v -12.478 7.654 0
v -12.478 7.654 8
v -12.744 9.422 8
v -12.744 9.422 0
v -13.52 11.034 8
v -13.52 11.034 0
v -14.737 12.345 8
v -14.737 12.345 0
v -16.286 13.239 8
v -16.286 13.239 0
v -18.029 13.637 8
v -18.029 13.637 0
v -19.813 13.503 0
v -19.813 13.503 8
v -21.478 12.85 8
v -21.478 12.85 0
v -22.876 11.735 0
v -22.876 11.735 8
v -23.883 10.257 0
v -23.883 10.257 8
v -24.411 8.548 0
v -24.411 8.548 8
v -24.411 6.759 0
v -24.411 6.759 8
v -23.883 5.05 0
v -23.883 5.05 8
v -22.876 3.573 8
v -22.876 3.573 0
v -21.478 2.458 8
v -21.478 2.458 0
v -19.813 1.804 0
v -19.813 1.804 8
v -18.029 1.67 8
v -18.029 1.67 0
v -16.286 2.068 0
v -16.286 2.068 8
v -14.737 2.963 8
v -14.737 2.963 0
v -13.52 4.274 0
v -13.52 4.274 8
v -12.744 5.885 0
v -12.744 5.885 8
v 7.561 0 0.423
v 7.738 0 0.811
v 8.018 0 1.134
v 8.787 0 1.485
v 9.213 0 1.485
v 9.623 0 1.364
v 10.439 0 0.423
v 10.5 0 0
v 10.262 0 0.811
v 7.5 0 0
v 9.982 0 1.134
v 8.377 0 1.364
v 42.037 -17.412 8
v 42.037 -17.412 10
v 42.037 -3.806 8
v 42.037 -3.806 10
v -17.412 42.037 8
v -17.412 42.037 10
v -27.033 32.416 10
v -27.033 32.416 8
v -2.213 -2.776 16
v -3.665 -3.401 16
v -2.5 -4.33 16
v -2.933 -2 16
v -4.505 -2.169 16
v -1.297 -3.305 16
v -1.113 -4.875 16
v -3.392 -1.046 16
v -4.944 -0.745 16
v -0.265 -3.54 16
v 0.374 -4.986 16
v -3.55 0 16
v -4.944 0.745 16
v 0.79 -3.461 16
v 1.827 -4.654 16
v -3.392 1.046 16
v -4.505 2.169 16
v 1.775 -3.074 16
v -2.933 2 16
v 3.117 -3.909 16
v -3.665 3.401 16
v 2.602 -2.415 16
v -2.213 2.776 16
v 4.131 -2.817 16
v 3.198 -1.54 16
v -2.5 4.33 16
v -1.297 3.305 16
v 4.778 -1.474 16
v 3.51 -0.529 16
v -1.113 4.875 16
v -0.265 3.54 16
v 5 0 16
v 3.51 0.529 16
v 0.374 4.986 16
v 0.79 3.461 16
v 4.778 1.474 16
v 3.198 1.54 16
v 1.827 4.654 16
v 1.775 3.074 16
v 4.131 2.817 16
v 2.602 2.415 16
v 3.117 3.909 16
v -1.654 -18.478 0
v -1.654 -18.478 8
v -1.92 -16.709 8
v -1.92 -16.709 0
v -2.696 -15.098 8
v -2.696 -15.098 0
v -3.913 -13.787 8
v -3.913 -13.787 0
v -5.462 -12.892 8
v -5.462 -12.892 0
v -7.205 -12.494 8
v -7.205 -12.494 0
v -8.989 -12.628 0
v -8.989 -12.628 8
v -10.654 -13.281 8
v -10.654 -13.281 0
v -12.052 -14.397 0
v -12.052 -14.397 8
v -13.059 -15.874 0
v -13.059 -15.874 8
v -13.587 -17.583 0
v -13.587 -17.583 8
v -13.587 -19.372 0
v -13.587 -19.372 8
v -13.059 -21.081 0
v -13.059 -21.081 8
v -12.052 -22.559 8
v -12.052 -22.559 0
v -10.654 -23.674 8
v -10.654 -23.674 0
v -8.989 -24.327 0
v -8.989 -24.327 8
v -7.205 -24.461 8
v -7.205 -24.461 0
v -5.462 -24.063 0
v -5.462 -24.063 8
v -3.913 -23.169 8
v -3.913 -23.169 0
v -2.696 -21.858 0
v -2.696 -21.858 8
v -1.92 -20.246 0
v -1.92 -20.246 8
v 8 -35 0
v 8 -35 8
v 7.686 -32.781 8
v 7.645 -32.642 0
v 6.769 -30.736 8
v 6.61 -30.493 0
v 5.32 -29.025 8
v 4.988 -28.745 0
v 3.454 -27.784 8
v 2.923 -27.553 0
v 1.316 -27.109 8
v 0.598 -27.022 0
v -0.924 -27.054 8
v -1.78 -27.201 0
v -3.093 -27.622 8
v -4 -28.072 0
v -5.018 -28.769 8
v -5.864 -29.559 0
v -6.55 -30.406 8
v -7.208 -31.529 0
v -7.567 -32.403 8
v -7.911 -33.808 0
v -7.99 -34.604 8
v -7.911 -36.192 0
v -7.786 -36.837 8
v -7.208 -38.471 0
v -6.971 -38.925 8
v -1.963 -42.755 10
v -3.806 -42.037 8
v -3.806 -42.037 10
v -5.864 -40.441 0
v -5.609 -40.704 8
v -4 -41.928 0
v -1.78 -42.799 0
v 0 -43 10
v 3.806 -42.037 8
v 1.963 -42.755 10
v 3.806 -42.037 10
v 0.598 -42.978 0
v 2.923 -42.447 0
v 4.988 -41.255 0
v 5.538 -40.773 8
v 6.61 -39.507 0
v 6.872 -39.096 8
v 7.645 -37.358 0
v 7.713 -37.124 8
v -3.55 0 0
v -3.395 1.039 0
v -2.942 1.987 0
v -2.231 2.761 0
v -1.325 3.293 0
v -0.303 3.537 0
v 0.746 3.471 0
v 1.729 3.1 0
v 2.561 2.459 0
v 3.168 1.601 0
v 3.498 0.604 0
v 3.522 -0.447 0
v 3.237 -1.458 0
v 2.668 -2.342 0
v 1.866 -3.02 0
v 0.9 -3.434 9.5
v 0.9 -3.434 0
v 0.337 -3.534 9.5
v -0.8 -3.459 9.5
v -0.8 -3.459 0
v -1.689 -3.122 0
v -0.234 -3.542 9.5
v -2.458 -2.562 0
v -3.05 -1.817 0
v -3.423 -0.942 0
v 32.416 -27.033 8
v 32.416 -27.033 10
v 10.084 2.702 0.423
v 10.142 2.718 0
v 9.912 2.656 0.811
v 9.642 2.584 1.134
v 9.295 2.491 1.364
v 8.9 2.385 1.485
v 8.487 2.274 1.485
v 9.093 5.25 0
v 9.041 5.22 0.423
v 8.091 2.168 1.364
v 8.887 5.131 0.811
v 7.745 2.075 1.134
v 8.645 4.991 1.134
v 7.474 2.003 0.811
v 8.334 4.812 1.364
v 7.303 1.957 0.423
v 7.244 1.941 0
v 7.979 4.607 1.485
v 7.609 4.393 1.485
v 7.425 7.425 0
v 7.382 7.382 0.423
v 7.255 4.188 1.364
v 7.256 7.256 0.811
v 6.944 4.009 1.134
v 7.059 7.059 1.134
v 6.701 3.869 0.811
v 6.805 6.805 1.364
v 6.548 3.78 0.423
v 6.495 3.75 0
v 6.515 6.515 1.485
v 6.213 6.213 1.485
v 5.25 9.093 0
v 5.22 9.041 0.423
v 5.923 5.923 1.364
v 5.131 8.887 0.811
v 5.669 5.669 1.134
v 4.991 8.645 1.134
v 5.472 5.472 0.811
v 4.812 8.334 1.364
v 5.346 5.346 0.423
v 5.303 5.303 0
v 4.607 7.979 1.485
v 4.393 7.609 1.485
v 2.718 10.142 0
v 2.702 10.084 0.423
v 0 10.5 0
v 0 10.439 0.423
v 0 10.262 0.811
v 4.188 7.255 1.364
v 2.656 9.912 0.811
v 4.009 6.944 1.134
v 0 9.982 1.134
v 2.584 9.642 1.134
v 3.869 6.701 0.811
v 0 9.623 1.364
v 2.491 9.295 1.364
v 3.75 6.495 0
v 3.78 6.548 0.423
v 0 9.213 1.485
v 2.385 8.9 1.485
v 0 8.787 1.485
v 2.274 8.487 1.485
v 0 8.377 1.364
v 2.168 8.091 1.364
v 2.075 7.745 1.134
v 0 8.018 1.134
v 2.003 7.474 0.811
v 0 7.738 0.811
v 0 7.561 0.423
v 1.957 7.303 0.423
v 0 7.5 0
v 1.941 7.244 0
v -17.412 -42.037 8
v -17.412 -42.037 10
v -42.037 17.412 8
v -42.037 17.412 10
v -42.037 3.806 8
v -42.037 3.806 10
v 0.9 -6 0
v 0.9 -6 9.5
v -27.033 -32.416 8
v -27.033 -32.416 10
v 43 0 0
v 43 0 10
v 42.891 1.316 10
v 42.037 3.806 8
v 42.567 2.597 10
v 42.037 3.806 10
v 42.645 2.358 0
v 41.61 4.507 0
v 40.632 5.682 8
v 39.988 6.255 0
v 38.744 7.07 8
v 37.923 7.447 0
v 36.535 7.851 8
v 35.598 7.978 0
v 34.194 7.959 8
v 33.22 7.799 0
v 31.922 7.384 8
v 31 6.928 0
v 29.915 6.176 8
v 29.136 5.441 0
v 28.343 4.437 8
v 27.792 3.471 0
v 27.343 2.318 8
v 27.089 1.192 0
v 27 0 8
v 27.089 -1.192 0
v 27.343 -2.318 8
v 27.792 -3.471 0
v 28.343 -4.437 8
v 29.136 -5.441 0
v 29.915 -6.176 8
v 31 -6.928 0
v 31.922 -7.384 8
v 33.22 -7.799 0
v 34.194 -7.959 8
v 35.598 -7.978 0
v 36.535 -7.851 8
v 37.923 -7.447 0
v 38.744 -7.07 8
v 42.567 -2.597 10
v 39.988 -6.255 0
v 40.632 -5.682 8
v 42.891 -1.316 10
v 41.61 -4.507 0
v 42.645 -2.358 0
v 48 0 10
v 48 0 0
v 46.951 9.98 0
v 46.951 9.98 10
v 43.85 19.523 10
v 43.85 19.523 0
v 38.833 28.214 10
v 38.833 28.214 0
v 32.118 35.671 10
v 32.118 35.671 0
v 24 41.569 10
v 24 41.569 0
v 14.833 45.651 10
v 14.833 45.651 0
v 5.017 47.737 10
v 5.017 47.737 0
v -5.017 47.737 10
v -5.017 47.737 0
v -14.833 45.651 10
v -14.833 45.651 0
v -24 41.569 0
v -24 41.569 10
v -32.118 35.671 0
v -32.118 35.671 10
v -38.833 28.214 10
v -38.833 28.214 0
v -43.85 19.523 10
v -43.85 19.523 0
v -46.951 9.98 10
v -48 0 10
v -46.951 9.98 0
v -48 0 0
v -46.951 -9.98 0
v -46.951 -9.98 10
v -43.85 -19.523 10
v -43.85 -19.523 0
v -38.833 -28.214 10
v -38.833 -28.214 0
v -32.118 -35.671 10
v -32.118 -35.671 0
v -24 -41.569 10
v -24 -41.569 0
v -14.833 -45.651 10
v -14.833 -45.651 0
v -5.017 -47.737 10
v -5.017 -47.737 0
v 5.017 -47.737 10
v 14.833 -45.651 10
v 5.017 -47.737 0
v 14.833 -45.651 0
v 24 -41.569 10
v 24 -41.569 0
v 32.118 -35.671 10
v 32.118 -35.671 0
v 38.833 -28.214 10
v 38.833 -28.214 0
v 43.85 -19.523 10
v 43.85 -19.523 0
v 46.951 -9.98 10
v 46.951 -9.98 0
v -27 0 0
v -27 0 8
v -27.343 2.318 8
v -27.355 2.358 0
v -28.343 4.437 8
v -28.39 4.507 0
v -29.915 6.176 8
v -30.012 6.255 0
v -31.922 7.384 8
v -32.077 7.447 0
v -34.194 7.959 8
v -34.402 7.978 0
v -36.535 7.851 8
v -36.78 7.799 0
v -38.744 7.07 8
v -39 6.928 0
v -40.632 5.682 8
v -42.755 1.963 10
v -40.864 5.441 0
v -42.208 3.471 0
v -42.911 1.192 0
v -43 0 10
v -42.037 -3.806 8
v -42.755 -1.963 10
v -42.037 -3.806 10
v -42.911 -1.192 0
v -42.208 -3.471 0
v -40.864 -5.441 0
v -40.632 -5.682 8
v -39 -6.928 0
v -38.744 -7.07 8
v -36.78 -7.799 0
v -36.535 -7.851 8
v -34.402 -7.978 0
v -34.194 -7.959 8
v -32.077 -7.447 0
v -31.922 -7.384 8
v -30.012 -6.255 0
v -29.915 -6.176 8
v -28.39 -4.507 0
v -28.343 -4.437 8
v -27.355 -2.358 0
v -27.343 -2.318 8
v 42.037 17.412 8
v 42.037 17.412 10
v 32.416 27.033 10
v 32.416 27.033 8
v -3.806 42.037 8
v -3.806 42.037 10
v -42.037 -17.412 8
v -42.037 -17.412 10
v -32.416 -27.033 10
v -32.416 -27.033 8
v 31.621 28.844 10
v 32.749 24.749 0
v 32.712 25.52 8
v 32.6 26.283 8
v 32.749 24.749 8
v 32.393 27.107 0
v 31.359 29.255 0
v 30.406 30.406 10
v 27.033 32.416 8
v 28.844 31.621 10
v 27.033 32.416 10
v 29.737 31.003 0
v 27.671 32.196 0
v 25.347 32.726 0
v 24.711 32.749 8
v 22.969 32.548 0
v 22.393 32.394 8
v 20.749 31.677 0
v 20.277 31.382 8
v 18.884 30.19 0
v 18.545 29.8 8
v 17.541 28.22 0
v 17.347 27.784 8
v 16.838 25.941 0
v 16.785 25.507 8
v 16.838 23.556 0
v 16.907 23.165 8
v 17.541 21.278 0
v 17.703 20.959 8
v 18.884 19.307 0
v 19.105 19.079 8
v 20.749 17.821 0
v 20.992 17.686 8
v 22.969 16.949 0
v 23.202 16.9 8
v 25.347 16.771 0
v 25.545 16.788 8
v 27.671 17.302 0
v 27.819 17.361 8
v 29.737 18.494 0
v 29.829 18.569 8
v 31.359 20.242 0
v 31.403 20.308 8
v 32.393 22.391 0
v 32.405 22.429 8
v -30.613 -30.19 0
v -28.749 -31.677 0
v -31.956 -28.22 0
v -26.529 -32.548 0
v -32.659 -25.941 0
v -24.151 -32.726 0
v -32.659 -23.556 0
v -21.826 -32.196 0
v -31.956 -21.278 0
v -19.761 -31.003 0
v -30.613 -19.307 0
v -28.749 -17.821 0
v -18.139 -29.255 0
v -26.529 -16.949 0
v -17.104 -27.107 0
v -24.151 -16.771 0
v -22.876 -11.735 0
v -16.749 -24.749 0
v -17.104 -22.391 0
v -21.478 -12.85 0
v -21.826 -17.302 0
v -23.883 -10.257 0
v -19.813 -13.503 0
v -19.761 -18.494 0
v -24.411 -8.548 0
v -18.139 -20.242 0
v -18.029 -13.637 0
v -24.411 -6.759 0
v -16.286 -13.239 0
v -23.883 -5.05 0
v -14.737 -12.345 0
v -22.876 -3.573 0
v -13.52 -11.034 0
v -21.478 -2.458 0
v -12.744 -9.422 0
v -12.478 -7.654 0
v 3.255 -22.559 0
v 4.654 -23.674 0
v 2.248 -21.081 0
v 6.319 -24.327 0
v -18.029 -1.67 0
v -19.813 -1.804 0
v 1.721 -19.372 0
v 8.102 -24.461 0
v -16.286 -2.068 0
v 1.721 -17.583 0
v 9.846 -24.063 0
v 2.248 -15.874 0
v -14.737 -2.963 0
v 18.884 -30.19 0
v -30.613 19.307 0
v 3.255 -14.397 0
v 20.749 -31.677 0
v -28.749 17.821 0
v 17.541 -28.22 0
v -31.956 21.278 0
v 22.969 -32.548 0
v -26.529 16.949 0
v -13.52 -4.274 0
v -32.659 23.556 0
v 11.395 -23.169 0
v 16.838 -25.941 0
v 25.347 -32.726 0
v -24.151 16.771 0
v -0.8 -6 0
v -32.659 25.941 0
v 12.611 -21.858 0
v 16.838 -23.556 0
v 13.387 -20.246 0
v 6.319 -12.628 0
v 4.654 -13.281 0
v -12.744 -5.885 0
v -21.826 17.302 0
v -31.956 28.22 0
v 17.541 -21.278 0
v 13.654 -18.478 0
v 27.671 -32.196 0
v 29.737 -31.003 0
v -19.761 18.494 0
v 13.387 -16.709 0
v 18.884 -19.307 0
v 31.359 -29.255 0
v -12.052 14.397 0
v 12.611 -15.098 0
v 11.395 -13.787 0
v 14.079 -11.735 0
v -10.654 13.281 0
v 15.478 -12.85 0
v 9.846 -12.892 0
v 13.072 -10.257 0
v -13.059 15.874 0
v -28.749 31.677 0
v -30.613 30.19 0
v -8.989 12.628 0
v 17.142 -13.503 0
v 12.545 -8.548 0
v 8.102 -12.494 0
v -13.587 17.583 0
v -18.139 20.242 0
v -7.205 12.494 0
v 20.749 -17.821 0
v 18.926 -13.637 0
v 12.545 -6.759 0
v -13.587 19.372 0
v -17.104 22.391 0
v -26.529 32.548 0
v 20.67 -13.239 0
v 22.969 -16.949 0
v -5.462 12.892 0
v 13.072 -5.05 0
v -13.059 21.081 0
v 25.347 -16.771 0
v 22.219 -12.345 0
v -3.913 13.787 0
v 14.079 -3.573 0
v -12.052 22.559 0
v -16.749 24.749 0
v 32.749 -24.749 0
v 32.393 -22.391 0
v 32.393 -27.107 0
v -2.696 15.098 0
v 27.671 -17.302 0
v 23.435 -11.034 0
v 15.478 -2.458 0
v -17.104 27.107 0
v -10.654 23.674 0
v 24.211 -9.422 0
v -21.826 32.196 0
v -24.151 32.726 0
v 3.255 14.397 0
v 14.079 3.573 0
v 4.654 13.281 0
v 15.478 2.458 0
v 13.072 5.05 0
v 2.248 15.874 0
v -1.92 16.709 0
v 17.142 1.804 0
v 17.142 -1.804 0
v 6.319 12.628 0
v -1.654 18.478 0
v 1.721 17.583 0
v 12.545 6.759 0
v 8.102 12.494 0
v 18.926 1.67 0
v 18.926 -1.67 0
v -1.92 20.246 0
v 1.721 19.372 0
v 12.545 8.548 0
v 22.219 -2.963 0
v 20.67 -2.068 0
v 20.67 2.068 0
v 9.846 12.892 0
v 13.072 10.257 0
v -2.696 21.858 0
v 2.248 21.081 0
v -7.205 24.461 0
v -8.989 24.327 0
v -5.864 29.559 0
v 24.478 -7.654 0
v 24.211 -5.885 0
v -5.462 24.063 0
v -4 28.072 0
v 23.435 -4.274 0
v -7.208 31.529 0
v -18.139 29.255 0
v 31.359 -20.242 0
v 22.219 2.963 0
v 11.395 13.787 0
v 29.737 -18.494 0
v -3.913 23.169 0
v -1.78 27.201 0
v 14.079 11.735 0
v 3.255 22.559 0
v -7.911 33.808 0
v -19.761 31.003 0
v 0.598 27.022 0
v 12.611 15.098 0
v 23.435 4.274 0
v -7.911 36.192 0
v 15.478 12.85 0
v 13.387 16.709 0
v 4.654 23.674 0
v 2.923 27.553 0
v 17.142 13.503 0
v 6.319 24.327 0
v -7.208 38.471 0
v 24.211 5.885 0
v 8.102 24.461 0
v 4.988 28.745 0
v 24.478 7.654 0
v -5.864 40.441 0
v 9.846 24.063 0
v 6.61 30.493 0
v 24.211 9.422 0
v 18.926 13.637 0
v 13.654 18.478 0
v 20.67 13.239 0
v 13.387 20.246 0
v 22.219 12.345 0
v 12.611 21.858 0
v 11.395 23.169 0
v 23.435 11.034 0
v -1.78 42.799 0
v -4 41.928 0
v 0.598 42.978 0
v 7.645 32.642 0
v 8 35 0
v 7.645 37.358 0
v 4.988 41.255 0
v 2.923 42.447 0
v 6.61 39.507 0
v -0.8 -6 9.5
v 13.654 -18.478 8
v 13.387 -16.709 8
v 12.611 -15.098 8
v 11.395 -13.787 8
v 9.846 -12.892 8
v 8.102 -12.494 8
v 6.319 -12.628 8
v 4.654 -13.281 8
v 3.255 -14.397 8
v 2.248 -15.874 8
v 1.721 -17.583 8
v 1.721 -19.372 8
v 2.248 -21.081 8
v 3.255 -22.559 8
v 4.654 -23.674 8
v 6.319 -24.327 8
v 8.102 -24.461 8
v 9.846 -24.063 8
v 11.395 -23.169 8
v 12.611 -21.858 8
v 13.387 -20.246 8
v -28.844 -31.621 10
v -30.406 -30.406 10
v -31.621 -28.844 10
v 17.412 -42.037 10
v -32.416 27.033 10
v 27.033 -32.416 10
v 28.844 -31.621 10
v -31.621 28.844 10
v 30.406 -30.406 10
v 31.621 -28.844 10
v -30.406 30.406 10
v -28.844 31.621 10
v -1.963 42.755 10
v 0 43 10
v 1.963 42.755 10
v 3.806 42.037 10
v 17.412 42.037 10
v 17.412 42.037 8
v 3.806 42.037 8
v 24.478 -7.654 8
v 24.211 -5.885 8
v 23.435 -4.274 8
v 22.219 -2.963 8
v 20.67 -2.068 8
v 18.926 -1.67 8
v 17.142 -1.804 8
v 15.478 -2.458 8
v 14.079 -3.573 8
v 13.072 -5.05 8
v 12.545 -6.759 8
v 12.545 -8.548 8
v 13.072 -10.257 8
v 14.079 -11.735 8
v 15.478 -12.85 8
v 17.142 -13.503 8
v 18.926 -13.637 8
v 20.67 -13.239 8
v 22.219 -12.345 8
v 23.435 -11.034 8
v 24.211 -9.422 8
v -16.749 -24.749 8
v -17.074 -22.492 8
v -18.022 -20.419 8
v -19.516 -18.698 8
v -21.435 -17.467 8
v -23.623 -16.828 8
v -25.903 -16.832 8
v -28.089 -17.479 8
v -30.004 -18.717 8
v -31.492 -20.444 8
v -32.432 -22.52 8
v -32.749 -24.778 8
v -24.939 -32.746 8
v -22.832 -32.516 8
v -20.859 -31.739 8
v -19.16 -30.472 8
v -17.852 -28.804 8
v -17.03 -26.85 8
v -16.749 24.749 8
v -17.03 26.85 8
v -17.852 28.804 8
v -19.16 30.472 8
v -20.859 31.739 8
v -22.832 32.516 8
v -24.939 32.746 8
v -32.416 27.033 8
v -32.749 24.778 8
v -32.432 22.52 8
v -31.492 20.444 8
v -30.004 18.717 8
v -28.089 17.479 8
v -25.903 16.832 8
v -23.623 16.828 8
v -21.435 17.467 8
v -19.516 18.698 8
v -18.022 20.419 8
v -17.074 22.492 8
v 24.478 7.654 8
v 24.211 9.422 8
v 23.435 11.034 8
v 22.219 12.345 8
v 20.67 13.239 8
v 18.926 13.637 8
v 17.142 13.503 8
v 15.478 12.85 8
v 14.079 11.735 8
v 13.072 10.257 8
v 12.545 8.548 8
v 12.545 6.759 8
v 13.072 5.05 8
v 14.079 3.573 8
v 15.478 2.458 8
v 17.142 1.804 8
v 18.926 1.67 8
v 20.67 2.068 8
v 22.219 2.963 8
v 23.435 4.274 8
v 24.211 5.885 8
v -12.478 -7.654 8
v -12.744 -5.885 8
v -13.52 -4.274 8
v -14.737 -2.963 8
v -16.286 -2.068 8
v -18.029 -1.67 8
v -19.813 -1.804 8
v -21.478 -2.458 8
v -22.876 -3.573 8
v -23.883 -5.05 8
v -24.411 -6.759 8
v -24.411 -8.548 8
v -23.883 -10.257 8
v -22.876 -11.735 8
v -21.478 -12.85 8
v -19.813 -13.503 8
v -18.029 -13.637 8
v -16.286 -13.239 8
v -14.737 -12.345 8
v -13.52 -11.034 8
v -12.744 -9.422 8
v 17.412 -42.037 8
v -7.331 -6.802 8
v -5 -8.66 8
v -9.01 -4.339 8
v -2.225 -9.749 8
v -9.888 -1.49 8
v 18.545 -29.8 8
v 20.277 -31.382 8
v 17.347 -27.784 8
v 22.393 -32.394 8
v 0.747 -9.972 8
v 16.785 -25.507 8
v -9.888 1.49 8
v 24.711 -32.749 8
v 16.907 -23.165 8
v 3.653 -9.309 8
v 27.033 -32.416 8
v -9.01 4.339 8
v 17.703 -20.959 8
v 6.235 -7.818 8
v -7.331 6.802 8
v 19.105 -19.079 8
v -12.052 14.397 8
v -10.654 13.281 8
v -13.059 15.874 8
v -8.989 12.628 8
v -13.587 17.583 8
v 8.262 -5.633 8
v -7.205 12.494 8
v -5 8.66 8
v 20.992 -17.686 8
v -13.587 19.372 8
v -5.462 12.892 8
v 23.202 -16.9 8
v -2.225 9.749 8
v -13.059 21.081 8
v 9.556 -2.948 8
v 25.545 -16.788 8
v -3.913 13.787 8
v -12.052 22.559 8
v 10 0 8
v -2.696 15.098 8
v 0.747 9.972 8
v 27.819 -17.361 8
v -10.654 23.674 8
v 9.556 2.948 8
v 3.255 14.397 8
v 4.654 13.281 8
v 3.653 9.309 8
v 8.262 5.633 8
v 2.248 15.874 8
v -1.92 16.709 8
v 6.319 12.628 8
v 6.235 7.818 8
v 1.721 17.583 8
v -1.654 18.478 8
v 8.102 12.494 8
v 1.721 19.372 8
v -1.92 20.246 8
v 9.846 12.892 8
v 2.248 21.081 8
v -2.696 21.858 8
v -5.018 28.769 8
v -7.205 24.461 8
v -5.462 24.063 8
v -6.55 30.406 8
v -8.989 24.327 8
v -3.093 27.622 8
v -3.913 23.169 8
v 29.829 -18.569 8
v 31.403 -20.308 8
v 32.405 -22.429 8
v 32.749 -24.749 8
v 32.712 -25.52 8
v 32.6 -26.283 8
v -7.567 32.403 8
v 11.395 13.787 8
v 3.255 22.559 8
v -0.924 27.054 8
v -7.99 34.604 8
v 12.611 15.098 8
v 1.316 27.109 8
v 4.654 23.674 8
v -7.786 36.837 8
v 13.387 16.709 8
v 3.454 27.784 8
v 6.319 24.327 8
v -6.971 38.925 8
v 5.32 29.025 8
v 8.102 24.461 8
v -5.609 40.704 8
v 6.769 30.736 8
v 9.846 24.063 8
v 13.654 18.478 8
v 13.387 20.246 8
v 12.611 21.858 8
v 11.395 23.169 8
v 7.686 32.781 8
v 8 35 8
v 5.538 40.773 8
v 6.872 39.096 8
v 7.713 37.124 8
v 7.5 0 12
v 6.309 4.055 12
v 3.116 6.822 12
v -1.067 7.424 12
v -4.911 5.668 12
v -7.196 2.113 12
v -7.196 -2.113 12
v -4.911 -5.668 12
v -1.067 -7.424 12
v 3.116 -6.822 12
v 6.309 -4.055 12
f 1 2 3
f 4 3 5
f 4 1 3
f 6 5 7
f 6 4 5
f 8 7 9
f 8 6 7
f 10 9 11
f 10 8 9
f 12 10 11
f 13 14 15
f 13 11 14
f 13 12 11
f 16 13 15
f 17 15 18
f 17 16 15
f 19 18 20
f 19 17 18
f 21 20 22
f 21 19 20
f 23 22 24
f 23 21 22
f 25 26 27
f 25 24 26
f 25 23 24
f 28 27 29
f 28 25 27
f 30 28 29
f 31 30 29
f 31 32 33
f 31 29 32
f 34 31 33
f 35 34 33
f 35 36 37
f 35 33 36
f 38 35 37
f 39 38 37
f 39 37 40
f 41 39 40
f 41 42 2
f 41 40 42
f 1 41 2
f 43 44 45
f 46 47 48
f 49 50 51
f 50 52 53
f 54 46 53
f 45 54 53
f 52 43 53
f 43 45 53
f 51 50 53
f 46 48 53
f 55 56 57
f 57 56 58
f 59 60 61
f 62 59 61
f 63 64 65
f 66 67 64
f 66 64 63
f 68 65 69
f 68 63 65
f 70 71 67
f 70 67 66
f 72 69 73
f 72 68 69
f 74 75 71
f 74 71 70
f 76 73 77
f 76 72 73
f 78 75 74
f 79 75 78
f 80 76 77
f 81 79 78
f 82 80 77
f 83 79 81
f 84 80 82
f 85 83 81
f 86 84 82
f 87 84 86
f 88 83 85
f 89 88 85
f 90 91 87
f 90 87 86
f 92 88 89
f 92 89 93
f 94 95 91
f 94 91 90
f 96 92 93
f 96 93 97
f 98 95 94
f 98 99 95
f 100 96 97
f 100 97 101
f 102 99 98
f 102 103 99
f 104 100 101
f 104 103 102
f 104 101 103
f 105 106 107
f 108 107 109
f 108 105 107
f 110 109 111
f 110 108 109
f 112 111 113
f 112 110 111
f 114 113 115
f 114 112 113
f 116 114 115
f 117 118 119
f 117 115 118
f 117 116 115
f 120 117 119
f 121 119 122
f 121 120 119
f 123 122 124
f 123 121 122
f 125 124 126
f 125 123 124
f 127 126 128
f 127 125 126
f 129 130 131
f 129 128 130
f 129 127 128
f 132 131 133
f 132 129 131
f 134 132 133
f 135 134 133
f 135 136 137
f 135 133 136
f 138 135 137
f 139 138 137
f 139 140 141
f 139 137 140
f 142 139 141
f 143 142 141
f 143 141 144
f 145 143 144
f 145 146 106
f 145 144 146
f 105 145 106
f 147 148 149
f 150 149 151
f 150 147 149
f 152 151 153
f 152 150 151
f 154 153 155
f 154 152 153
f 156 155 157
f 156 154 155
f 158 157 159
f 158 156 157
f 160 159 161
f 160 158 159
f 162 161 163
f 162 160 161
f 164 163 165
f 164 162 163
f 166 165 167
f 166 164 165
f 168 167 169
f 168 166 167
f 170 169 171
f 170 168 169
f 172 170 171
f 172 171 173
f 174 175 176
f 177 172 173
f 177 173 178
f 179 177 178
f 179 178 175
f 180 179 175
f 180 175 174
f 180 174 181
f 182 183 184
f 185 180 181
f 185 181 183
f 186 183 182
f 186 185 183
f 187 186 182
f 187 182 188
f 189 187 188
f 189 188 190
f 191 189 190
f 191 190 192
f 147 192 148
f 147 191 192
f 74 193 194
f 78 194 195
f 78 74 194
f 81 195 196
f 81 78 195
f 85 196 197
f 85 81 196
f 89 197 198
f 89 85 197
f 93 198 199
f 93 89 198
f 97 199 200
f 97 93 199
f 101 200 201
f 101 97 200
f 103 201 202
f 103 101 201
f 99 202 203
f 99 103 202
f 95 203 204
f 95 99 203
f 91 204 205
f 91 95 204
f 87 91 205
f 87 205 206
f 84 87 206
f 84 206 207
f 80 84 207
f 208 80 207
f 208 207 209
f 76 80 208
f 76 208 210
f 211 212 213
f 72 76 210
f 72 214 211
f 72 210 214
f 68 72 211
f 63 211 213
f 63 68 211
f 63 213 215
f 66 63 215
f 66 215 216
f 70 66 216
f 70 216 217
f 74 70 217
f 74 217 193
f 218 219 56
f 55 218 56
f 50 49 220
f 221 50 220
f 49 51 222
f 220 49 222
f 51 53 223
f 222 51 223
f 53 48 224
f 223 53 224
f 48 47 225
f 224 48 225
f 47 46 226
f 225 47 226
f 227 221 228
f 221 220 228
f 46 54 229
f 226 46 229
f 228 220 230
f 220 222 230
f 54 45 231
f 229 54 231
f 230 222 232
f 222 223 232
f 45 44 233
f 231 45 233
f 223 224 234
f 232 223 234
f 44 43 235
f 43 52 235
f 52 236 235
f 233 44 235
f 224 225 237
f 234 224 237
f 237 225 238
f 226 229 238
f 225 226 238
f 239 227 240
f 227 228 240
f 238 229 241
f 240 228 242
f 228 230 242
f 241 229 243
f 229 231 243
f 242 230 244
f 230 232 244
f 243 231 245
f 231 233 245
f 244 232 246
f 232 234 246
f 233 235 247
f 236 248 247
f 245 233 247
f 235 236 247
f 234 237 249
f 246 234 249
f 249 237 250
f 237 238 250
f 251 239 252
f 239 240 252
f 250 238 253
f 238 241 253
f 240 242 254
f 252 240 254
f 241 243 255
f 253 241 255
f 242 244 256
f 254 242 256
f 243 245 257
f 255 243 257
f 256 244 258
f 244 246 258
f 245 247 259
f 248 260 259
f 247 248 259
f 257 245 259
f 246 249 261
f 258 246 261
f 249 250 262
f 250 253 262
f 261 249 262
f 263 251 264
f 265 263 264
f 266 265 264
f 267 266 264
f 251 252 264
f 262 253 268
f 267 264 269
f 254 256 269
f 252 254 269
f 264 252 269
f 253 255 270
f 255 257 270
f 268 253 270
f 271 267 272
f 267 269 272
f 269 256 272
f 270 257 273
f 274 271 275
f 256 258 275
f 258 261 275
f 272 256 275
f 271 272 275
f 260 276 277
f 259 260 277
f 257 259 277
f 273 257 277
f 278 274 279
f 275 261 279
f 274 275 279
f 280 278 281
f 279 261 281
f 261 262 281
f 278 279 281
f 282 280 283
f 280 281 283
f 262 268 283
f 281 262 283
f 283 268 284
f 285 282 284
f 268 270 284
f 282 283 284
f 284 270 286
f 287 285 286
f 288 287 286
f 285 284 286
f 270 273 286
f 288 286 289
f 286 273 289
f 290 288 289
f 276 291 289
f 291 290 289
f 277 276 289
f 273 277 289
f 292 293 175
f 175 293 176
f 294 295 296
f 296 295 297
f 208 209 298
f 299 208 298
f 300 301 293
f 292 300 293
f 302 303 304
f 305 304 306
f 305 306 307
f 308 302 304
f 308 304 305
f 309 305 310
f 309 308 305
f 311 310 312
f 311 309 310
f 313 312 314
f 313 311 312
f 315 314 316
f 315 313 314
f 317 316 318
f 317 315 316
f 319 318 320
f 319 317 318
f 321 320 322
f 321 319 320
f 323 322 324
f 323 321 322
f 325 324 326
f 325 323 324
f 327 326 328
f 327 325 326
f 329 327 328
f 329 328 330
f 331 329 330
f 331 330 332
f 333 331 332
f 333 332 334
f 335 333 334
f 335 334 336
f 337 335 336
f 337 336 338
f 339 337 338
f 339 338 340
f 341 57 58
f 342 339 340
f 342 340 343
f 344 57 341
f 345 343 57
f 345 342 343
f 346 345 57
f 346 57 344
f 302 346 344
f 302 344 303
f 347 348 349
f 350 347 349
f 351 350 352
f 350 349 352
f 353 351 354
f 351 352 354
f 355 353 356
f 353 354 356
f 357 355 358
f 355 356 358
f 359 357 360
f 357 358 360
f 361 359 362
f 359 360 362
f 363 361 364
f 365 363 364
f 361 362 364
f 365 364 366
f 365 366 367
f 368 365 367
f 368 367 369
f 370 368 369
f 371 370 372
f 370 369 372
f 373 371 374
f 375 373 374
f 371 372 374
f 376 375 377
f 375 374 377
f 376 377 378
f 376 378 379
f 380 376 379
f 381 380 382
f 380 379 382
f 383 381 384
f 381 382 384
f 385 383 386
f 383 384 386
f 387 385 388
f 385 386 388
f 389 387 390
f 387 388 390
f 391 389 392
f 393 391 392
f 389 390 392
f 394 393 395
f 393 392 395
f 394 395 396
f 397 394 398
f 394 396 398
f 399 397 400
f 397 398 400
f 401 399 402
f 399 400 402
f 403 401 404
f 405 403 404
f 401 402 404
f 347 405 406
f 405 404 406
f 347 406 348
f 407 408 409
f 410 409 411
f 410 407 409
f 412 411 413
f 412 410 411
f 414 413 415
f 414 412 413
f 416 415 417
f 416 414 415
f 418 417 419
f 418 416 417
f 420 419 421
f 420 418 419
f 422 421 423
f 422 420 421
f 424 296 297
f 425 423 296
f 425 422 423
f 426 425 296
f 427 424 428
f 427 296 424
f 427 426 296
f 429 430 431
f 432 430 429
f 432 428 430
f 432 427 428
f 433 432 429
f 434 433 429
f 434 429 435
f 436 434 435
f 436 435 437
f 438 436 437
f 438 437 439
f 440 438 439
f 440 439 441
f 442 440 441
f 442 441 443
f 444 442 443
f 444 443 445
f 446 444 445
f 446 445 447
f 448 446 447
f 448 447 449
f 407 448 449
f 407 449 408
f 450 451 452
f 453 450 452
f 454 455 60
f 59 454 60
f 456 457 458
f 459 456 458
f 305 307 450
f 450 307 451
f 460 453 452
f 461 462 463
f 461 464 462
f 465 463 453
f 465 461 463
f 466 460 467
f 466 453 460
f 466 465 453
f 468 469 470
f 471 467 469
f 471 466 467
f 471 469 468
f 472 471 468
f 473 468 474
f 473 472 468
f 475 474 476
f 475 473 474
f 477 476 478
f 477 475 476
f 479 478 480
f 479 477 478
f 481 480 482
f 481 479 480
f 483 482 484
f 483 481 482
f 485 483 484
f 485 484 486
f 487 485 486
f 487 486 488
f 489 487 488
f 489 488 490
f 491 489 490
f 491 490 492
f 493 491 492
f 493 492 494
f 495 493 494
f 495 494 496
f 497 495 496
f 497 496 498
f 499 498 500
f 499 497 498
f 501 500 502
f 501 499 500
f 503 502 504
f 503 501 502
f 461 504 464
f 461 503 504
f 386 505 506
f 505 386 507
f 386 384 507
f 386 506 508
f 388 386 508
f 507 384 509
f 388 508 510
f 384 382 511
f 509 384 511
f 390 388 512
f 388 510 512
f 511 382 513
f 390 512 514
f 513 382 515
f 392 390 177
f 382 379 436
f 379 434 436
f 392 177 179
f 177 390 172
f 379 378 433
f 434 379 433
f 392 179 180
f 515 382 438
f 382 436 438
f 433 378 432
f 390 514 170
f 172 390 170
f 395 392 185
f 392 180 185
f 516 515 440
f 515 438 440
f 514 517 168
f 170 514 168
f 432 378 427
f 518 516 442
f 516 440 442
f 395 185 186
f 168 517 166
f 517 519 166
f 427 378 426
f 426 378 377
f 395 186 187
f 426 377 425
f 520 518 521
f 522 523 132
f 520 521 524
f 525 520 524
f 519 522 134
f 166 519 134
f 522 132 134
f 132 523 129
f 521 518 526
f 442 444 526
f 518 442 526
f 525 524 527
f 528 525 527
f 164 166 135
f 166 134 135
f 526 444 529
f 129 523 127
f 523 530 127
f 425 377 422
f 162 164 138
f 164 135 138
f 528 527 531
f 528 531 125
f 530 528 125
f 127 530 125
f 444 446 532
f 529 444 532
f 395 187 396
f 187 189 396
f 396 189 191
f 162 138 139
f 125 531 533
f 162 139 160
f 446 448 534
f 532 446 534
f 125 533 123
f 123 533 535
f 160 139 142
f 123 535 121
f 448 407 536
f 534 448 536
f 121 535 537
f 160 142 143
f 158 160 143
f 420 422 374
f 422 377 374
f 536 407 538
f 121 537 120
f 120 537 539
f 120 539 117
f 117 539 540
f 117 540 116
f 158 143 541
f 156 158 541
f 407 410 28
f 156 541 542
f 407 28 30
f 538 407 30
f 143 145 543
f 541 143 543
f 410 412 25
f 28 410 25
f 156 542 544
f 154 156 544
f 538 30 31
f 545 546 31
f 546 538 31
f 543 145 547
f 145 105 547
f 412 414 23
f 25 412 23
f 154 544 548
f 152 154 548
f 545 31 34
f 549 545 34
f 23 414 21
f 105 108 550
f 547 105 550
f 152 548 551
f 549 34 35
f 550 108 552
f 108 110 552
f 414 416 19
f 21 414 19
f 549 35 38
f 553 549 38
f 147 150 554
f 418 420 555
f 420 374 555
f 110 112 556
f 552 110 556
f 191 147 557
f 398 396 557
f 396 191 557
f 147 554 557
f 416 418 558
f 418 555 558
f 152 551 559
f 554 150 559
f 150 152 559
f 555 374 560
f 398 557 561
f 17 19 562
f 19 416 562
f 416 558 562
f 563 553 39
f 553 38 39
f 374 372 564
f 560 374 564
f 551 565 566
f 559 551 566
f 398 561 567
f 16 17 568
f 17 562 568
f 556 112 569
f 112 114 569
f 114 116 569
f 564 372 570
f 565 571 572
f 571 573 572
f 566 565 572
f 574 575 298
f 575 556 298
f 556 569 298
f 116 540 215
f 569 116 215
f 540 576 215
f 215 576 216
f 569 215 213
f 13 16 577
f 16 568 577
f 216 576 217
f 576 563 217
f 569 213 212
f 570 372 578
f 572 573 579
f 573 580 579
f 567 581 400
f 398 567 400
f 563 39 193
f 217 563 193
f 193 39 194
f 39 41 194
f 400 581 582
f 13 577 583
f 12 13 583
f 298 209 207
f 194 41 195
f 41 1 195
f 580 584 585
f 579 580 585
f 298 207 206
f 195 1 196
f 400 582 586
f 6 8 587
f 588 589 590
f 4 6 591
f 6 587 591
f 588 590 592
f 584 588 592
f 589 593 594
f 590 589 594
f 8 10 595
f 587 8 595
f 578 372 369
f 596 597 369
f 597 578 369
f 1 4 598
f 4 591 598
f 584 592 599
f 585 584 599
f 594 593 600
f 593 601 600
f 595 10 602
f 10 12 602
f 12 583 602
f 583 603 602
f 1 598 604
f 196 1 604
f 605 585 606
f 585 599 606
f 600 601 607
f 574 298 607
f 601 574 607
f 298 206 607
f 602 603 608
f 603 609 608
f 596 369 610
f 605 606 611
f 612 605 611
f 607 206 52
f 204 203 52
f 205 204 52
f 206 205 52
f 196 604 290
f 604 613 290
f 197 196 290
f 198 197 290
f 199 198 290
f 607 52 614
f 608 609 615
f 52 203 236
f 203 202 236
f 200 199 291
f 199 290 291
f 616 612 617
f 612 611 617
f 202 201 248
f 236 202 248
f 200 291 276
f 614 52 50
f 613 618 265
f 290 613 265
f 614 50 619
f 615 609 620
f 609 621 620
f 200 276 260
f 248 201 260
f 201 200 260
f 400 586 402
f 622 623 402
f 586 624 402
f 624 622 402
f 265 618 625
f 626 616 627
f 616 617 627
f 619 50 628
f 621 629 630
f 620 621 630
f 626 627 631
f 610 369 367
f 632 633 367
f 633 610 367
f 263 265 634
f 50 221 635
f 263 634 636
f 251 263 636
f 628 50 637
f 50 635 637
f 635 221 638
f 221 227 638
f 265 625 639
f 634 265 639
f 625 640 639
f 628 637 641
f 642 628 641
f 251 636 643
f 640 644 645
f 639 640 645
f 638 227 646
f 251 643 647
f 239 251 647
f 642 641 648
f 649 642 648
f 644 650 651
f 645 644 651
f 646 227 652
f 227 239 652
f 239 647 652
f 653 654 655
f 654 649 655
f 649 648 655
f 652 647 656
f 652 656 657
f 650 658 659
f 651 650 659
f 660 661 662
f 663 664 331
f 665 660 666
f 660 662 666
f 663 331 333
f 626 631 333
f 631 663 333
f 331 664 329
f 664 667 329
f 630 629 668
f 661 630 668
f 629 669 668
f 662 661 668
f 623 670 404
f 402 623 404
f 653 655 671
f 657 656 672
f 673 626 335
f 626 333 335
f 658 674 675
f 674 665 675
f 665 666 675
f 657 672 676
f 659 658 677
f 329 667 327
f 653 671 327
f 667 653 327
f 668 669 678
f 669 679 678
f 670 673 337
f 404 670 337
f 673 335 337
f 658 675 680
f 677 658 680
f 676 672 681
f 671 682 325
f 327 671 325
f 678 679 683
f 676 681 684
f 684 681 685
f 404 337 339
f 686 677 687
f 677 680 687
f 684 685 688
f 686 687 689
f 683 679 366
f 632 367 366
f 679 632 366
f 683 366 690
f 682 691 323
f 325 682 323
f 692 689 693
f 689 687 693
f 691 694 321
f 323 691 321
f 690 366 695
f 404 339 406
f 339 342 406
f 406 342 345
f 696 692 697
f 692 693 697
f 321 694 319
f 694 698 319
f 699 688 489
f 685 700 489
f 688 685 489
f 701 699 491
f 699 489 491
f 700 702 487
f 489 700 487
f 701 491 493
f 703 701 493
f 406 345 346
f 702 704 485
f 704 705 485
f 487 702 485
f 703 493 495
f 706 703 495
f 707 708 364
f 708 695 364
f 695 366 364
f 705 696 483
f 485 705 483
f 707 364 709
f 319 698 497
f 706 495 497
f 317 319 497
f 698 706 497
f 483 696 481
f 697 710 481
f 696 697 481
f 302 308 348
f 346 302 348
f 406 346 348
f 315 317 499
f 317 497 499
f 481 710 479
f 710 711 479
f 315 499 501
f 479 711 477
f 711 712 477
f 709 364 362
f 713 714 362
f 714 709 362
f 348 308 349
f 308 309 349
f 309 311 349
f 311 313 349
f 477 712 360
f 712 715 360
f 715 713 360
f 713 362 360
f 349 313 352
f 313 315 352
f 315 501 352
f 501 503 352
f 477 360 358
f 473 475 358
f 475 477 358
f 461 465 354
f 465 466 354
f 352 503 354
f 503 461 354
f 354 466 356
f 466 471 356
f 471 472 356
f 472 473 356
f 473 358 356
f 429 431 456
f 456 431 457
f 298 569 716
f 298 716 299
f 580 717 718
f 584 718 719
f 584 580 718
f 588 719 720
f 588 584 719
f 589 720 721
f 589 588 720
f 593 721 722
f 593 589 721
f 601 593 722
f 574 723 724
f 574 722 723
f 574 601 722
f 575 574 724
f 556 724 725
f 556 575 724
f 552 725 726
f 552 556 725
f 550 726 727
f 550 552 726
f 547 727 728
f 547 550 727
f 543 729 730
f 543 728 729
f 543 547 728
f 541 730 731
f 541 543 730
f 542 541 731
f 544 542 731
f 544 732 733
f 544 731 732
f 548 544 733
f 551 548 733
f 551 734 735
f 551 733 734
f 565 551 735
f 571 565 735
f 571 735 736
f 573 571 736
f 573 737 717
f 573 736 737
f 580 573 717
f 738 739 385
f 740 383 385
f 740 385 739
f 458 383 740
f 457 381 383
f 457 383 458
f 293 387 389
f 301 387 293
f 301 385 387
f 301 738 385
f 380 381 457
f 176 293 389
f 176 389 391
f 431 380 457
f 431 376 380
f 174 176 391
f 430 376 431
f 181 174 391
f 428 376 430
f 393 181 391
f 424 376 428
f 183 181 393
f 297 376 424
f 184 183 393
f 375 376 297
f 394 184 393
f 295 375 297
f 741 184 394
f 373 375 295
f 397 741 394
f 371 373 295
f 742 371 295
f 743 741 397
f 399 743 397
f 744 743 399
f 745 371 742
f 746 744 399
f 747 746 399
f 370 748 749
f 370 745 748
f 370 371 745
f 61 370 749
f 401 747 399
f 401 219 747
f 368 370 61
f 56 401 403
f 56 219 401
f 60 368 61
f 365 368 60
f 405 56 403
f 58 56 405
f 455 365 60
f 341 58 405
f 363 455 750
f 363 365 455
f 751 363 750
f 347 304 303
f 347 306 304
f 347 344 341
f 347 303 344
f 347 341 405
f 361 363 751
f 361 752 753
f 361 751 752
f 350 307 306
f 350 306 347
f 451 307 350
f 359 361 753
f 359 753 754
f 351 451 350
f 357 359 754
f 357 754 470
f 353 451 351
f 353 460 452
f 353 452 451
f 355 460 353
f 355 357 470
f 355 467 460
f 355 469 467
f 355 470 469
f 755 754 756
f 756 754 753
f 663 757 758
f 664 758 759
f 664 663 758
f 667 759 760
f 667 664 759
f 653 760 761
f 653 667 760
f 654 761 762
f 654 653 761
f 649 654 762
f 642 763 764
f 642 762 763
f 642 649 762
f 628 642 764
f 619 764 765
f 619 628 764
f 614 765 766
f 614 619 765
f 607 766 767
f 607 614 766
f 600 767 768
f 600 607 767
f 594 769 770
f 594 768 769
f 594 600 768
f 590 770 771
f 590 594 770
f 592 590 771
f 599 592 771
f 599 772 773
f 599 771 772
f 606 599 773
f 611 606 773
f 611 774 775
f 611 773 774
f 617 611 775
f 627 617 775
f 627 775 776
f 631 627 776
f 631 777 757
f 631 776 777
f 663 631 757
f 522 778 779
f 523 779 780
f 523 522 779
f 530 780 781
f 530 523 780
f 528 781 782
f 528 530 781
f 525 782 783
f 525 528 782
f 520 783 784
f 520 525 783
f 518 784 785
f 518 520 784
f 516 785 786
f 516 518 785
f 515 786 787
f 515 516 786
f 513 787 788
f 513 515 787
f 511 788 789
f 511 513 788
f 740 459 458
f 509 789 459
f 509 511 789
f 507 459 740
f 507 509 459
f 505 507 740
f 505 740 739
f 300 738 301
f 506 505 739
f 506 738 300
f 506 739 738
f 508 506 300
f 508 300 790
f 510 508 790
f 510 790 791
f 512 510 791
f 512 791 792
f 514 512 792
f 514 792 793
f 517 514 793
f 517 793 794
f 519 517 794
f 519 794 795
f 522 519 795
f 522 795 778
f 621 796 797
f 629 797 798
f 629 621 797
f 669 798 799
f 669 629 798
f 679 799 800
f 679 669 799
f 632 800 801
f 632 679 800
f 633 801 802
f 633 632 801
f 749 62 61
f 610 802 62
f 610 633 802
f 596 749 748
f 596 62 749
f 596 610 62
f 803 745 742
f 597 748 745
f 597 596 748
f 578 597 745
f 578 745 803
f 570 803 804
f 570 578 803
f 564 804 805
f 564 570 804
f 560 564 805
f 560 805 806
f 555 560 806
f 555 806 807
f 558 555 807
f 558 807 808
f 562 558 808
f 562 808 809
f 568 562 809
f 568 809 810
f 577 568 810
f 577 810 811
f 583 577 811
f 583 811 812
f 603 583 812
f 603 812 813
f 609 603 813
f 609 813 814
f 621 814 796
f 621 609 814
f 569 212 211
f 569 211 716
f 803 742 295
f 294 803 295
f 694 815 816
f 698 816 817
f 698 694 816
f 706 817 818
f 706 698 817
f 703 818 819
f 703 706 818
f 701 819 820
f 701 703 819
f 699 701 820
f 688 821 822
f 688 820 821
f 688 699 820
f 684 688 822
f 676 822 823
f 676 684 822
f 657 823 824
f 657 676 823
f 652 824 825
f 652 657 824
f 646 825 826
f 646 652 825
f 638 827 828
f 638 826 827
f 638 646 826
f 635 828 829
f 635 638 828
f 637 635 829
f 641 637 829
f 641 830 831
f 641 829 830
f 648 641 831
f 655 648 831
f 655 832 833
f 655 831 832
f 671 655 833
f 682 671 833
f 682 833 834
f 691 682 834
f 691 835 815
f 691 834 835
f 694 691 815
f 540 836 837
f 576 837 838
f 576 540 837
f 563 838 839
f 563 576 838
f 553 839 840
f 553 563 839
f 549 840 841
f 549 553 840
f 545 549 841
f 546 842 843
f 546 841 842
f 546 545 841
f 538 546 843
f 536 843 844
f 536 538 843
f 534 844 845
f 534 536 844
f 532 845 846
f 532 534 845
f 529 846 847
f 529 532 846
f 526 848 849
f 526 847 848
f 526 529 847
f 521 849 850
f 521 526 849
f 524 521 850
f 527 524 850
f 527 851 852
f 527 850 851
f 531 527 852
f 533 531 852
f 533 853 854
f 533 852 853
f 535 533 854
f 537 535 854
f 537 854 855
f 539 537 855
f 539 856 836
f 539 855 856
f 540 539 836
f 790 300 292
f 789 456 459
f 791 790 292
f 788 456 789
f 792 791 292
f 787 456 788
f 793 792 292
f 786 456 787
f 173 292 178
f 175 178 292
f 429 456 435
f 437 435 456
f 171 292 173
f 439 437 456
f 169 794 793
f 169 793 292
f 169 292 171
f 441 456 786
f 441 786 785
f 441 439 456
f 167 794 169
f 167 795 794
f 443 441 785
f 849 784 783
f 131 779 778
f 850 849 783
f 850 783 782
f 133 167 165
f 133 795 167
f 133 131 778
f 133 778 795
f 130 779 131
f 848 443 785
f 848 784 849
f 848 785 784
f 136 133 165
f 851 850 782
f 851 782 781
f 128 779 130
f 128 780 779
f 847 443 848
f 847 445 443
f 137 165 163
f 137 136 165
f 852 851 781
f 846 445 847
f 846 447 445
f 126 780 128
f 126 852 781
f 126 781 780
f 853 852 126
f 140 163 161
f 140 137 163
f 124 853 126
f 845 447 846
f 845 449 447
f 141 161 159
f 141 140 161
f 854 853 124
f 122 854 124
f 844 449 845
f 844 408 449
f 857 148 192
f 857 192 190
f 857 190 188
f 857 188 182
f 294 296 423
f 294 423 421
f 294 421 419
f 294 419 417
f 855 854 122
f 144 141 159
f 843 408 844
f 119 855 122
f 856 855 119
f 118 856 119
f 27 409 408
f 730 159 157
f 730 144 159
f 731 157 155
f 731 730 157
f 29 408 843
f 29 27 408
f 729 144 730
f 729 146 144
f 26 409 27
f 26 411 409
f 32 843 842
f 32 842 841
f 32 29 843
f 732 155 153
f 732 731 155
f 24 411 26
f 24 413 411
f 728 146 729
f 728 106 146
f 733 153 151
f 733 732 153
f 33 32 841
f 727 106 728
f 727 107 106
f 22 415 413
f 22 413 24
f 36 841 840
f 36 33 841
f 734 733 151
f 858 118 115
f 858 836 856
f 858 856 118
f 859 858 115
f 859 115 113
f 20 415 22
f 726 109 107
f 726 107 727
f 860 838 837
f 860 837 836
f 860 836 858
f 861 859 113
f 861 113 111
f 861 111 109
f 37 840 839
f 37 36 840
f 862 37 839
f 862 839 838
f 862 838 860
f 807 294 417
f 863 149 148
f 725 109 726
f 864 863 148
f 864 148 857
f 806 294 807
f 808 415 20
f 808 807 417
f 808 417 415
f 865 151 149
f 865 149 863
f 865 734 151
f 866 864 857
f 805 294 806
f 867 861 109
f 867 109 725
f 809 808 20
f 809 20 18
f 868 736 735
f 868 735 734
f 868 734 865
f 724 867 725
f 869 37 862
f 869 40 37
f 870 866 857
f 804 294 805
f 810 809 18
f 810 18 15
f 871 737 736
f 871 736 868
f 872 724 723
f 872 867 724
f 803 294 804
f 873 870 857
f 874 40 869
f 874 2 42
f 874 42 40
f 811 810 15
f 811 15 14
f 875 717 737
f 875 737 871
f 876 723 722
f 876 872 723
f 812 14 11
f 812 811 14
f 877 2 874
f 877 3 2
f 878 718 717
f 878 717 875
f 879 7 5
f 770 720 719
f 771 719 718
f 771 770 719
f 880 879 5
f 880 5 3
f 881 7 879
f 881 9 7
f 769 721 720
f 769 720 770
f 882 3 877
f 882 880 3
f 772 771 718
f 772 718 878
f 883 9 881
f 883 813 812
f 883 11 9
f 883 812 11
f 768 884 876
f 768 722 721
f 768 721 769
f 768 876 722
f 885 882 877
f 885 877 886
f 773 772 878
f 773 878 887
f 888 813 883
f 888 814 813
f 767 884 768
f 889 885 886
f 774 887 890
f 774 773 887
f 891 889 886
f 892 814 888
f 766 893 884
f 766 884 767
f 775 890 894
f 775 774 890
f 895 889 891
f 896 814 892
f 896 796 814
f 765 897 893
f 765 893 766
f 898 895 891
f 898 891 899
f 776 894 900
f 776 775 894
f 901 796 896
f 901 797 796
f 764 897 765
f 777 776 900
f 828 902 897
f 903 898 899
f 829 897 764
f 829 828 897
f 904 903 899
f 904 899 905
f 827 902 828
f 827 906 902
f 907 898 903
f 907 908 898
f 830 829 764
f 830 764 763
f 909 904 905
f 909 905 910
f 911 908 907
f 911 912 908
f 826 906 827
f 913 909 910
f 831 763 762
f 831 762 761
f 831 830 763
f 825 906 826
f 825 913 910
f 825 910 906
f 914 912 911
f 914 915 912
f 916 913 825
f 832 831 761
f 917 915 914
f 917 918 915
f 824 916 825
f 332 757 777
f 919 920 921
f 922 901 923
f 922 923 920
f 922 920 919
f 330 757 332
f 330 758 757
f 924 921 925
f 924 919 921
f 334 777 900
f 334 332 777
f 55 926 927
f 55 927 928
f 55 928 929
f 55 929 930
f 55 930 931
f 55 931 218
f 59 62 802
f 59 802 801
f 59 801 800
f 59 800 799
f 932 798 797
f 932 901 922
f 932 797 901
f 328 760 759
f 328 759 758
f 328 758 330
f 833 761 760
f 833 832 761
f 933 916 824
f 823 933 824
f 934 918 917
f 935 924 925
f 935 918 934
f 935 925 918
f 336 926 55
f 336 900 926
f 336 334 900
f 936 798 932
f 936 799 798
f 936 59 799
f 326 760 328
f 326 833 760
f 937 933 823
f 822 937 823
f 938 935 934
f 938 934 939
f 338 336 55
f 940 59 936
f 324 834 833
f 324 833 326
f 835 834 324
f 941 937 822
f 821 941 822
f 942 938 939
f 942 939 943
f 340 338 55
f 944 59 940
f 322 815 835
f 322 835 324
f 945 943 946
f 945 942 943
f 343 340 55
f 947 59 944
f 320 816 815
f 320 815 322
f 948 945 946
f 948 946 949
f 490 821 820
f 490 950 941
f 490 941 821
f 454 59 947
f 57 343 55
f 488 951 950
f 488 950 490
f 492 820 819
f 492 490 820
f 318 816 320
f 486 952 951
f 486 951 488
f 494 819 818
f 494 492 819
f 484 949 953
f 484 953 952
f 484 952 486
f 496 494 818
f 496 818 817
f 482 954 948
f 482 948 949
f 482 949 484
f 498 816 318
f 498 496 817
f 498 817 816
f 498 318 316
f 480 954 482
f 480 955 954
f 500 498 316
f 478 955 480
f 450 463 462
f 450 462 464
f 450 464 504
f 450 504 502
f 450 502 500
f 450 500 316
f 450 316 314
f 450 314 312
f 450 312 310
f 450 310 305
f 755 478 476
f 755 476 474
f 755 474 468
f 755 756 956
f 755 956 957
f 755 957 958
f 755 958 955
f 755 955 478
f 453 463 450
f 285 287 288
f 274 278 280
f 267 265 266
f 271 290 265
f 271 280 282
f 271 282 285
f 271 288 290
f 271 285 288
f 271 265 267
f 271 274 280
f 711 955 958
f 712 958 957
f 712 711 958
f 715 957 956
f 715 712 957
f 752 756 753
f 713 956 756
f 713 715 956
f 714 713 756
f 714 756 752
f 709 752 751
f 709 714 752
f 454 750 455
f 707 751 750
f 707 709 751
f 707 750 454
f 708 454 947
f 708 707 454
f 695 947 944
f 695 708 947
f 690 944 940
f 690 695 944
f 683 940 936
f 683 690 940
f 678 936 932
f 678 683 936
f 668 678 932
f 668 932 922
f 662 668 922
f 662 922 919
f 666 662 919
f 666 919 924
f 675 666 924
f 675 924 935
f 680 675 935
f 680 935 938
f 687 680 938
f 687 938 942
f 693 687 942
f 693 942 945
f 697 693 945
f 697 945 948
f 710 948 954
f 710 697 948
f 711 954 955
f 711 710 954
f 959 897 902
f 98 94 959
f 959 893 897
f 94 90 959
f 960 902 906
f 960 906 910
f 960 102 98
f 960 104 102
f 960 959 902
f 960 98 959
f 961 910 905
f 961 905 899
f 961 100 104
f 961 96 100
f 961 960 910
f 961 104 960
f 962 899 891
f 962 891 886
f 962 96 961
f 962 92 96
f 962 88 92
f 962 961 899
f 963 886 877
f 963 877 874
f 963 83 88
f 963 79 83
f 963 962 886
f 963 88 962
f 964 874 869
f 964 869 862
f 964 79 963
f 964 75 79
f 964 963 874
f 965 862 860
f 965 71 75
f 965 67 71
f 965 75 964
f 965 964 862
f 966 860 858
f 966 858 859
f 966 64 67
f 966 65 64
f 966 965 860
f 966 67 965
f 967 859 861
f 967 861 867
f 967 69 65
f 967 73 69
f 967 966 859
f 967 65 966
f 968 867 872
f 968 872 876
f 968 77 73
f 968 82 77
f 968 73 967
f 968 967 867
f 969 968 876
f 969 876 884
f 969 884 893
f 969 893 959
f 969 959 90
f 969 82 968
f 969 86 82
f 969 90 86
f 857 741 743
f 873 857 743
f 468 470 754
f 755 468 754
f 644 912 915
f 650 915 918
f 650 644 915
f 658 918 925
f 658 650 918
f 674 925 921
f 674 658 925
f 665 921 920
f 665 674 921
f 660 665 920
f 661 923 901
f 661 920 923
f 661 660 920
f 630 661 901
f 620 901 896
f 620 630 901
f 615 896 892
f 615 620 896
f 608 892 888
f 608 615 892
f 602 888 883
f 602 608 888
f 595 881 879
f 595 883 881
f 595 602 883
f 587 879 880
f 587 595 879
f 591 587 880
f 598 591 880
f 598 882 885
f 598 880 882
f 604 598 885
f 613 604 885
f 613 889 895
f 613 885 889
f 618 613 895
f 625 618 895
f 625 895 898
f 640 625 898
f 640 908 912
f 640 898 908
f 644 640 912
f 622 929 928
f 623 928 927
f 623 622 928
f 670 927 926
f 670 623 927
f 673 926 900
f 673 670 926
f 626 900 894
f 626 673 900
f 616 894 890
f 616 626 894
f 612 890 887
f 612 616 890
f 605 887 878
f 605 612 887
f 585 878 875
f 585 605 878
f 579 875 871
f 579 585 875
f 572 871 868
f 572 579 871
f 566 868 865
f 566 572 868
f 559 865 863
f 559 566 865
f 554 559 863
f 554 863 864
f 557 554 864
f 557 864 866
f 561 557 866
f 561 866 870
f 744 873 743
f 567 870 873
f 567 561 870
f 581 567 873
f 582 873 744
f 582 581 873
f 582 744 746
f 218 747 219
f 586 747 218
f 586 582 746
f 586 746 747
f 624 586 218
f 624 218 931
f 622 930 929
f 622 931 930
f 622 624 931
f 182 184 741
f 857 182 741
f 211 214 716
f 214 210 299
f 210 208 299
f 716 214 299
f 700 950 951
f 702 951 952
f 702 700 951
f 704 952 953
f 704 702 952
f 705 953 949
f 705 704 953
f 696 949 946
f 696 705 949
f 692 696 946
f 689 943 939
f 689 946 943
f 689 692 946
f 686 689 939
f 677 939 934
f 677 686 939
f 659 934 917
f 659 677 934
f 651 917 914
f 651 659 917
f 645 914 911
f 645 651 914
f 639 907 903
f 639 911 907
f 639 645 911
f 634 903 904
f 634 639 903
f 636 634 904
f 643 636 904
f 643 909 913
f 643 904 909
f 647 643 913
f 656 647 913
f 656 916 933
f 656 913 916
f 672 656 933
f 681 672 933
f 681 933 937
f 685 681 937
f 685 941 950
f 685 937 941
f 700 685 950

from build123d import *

# Parameters (mm, degrees)
SKETCH_R       = 48
SKETCH_R_2     = 8
SKETCH_R_3     = 6
PAD_DEPTH      = 10
POCKET_DEPTH   = 2
CYLINDER_R     = 3.55
CYLINDER_DEPTH = 16
BOX_W          = 3
BOX_H          = 1.7
BOX_DEPTH      = 9.5
TORUS_R        = 1.5
TORUS_ANGLE    = 90


with BuildPart() as part:
    # Sketch → Pad (new body)
    with BuildSketch(Plane.XY):
        Circle(SKETCH_R)
        with Locations((0, 35)):
            Circle(SKETCH_R_2, mode=Mode.SUBTRACT)
        with Locations((24.748737, 24.748737)):
            Circle(SKETCH_R_2, mode=Mode.SUBTRACT)
        with Locations((35, 0)):
            Circle(SKETCH_R_2, mode=Mode.SUBTRACT)
        with Locations((24.748737, -24.748737)):
            Circle(SKETCH_R_2, mode=Mode.SUBTRACT)
        with Locations((0, -35)):
            Circle(SKETCH_R_2, mode=Mode.SUBTRACT)
        with Locations((-24.748737, -24.748737)):
            Circle(SKETCH_R_2, mode=Mode.SUBTRACT)
        with Locations((-35, 0)):
            Circle(SKETCH_R_2, mode=Mode.SUBTRACT)
        with Locations((-24.748737, 24.748737)):
            Circle(SKETCH_R_2, mode=Mode.SUBTRACT)
        with Locations((-7.653669, -18.477591)):
            Circle(SKETCH_R_3, mode=Mode.SUBTRACT)
        with Locations((7.653669, -18.477591)):
            Circle(SKETCH_R_3, mode=Mode.SUBTRACT)
        with Locations((18.477591, -7.653669)):
            Circle(SKETCH_R_3, mode=Mode.SUBTRACT)
        with Locations((18.477591, 7.653669)):
            Circle(SKETCH_R_3, mode=Mode.SUBTRACT)
        with Locations((7.653669, 18.477591)):
            Circle(SKETCH_R_3, mode=Mode.SUBTRACT)
        with Locations((-7.653669, 18.477591)):
            Circle(SKETCH_R_3, mode=Mode.SUBTRACT)
        with Locations((-18.477591, 7.653669)):
            Circle(SKETCH_R_3, mode=Mode.SUBTRACT)
        with Locations((-18.477591, -7.653669)):
            Circle(SKETCH_R_3, mode=Mode.SUBTRACT)
    extrude(amount=PAD_DEPTH)

    # Sketch001 (on Face19 of Pad) → Pocket (cut)
    with BuildSketch(Plane.XY.offset(10)):
        Polygon((42.036519, 17.412096), (17.412096, 42.036519), (-17.412096, 42.036519), (-42.036519, 17.412096), (-42.036519, -17.412096), (-17.412096, -42.036519), (17.412096, -42.036519), (42.036519, -17.412096), align=None)
    extrude(amount=-POCKET_DEPTH, mode=Mode.SUBTRACT)

    # Cone → Cone (revolve)
    with BuildSketch(Plane(origin=(0, 0, 8), x_dir=(1, 0, 0), z_dir=(0, -1, 0))):
        Polygon((0, 0), (10, 0), (5, 8), (0, 8), align=None)
    revolve(axis=Axis((0, 0, 8), (0, 0, 1)))

    # Cylinder → Cylinder (cut)
    with BuildSketch(Plane(origin=(0, 0, 16), x_dir=(-1, 0, 0), z_dir=(0, 0, -1))):
        Circle(CYLINDER_R)
    extrude(amount=CYLINDER_DEPTH, mode=Mode.SUBTRACT)

    # Box → Box (cut)
    with BuildSketch(Plane(origin=(-0.8, -3, 0), x_dir=(0, -1, 0), z_dir=(0, 0, 1))):
        with Locations((1.5, 0.85)):
            Rectangle(BOX_W, BOX_H)
    extrude(amount=BOX_DEPTH, mode=Mode.SUBTRACT)

    # Torus → Torus (revolve, cut)
    with BuildSketch(Plane.XZ):
        with Locations((9, 0)):
            Circle(TORUS_R)
    revolve(axis=Axis((0, 0, 0), (0, 0, 1)), revolution_arc=TORUS_ANGLE, mode=Mode.SUBTRACT)


solid = part.part
